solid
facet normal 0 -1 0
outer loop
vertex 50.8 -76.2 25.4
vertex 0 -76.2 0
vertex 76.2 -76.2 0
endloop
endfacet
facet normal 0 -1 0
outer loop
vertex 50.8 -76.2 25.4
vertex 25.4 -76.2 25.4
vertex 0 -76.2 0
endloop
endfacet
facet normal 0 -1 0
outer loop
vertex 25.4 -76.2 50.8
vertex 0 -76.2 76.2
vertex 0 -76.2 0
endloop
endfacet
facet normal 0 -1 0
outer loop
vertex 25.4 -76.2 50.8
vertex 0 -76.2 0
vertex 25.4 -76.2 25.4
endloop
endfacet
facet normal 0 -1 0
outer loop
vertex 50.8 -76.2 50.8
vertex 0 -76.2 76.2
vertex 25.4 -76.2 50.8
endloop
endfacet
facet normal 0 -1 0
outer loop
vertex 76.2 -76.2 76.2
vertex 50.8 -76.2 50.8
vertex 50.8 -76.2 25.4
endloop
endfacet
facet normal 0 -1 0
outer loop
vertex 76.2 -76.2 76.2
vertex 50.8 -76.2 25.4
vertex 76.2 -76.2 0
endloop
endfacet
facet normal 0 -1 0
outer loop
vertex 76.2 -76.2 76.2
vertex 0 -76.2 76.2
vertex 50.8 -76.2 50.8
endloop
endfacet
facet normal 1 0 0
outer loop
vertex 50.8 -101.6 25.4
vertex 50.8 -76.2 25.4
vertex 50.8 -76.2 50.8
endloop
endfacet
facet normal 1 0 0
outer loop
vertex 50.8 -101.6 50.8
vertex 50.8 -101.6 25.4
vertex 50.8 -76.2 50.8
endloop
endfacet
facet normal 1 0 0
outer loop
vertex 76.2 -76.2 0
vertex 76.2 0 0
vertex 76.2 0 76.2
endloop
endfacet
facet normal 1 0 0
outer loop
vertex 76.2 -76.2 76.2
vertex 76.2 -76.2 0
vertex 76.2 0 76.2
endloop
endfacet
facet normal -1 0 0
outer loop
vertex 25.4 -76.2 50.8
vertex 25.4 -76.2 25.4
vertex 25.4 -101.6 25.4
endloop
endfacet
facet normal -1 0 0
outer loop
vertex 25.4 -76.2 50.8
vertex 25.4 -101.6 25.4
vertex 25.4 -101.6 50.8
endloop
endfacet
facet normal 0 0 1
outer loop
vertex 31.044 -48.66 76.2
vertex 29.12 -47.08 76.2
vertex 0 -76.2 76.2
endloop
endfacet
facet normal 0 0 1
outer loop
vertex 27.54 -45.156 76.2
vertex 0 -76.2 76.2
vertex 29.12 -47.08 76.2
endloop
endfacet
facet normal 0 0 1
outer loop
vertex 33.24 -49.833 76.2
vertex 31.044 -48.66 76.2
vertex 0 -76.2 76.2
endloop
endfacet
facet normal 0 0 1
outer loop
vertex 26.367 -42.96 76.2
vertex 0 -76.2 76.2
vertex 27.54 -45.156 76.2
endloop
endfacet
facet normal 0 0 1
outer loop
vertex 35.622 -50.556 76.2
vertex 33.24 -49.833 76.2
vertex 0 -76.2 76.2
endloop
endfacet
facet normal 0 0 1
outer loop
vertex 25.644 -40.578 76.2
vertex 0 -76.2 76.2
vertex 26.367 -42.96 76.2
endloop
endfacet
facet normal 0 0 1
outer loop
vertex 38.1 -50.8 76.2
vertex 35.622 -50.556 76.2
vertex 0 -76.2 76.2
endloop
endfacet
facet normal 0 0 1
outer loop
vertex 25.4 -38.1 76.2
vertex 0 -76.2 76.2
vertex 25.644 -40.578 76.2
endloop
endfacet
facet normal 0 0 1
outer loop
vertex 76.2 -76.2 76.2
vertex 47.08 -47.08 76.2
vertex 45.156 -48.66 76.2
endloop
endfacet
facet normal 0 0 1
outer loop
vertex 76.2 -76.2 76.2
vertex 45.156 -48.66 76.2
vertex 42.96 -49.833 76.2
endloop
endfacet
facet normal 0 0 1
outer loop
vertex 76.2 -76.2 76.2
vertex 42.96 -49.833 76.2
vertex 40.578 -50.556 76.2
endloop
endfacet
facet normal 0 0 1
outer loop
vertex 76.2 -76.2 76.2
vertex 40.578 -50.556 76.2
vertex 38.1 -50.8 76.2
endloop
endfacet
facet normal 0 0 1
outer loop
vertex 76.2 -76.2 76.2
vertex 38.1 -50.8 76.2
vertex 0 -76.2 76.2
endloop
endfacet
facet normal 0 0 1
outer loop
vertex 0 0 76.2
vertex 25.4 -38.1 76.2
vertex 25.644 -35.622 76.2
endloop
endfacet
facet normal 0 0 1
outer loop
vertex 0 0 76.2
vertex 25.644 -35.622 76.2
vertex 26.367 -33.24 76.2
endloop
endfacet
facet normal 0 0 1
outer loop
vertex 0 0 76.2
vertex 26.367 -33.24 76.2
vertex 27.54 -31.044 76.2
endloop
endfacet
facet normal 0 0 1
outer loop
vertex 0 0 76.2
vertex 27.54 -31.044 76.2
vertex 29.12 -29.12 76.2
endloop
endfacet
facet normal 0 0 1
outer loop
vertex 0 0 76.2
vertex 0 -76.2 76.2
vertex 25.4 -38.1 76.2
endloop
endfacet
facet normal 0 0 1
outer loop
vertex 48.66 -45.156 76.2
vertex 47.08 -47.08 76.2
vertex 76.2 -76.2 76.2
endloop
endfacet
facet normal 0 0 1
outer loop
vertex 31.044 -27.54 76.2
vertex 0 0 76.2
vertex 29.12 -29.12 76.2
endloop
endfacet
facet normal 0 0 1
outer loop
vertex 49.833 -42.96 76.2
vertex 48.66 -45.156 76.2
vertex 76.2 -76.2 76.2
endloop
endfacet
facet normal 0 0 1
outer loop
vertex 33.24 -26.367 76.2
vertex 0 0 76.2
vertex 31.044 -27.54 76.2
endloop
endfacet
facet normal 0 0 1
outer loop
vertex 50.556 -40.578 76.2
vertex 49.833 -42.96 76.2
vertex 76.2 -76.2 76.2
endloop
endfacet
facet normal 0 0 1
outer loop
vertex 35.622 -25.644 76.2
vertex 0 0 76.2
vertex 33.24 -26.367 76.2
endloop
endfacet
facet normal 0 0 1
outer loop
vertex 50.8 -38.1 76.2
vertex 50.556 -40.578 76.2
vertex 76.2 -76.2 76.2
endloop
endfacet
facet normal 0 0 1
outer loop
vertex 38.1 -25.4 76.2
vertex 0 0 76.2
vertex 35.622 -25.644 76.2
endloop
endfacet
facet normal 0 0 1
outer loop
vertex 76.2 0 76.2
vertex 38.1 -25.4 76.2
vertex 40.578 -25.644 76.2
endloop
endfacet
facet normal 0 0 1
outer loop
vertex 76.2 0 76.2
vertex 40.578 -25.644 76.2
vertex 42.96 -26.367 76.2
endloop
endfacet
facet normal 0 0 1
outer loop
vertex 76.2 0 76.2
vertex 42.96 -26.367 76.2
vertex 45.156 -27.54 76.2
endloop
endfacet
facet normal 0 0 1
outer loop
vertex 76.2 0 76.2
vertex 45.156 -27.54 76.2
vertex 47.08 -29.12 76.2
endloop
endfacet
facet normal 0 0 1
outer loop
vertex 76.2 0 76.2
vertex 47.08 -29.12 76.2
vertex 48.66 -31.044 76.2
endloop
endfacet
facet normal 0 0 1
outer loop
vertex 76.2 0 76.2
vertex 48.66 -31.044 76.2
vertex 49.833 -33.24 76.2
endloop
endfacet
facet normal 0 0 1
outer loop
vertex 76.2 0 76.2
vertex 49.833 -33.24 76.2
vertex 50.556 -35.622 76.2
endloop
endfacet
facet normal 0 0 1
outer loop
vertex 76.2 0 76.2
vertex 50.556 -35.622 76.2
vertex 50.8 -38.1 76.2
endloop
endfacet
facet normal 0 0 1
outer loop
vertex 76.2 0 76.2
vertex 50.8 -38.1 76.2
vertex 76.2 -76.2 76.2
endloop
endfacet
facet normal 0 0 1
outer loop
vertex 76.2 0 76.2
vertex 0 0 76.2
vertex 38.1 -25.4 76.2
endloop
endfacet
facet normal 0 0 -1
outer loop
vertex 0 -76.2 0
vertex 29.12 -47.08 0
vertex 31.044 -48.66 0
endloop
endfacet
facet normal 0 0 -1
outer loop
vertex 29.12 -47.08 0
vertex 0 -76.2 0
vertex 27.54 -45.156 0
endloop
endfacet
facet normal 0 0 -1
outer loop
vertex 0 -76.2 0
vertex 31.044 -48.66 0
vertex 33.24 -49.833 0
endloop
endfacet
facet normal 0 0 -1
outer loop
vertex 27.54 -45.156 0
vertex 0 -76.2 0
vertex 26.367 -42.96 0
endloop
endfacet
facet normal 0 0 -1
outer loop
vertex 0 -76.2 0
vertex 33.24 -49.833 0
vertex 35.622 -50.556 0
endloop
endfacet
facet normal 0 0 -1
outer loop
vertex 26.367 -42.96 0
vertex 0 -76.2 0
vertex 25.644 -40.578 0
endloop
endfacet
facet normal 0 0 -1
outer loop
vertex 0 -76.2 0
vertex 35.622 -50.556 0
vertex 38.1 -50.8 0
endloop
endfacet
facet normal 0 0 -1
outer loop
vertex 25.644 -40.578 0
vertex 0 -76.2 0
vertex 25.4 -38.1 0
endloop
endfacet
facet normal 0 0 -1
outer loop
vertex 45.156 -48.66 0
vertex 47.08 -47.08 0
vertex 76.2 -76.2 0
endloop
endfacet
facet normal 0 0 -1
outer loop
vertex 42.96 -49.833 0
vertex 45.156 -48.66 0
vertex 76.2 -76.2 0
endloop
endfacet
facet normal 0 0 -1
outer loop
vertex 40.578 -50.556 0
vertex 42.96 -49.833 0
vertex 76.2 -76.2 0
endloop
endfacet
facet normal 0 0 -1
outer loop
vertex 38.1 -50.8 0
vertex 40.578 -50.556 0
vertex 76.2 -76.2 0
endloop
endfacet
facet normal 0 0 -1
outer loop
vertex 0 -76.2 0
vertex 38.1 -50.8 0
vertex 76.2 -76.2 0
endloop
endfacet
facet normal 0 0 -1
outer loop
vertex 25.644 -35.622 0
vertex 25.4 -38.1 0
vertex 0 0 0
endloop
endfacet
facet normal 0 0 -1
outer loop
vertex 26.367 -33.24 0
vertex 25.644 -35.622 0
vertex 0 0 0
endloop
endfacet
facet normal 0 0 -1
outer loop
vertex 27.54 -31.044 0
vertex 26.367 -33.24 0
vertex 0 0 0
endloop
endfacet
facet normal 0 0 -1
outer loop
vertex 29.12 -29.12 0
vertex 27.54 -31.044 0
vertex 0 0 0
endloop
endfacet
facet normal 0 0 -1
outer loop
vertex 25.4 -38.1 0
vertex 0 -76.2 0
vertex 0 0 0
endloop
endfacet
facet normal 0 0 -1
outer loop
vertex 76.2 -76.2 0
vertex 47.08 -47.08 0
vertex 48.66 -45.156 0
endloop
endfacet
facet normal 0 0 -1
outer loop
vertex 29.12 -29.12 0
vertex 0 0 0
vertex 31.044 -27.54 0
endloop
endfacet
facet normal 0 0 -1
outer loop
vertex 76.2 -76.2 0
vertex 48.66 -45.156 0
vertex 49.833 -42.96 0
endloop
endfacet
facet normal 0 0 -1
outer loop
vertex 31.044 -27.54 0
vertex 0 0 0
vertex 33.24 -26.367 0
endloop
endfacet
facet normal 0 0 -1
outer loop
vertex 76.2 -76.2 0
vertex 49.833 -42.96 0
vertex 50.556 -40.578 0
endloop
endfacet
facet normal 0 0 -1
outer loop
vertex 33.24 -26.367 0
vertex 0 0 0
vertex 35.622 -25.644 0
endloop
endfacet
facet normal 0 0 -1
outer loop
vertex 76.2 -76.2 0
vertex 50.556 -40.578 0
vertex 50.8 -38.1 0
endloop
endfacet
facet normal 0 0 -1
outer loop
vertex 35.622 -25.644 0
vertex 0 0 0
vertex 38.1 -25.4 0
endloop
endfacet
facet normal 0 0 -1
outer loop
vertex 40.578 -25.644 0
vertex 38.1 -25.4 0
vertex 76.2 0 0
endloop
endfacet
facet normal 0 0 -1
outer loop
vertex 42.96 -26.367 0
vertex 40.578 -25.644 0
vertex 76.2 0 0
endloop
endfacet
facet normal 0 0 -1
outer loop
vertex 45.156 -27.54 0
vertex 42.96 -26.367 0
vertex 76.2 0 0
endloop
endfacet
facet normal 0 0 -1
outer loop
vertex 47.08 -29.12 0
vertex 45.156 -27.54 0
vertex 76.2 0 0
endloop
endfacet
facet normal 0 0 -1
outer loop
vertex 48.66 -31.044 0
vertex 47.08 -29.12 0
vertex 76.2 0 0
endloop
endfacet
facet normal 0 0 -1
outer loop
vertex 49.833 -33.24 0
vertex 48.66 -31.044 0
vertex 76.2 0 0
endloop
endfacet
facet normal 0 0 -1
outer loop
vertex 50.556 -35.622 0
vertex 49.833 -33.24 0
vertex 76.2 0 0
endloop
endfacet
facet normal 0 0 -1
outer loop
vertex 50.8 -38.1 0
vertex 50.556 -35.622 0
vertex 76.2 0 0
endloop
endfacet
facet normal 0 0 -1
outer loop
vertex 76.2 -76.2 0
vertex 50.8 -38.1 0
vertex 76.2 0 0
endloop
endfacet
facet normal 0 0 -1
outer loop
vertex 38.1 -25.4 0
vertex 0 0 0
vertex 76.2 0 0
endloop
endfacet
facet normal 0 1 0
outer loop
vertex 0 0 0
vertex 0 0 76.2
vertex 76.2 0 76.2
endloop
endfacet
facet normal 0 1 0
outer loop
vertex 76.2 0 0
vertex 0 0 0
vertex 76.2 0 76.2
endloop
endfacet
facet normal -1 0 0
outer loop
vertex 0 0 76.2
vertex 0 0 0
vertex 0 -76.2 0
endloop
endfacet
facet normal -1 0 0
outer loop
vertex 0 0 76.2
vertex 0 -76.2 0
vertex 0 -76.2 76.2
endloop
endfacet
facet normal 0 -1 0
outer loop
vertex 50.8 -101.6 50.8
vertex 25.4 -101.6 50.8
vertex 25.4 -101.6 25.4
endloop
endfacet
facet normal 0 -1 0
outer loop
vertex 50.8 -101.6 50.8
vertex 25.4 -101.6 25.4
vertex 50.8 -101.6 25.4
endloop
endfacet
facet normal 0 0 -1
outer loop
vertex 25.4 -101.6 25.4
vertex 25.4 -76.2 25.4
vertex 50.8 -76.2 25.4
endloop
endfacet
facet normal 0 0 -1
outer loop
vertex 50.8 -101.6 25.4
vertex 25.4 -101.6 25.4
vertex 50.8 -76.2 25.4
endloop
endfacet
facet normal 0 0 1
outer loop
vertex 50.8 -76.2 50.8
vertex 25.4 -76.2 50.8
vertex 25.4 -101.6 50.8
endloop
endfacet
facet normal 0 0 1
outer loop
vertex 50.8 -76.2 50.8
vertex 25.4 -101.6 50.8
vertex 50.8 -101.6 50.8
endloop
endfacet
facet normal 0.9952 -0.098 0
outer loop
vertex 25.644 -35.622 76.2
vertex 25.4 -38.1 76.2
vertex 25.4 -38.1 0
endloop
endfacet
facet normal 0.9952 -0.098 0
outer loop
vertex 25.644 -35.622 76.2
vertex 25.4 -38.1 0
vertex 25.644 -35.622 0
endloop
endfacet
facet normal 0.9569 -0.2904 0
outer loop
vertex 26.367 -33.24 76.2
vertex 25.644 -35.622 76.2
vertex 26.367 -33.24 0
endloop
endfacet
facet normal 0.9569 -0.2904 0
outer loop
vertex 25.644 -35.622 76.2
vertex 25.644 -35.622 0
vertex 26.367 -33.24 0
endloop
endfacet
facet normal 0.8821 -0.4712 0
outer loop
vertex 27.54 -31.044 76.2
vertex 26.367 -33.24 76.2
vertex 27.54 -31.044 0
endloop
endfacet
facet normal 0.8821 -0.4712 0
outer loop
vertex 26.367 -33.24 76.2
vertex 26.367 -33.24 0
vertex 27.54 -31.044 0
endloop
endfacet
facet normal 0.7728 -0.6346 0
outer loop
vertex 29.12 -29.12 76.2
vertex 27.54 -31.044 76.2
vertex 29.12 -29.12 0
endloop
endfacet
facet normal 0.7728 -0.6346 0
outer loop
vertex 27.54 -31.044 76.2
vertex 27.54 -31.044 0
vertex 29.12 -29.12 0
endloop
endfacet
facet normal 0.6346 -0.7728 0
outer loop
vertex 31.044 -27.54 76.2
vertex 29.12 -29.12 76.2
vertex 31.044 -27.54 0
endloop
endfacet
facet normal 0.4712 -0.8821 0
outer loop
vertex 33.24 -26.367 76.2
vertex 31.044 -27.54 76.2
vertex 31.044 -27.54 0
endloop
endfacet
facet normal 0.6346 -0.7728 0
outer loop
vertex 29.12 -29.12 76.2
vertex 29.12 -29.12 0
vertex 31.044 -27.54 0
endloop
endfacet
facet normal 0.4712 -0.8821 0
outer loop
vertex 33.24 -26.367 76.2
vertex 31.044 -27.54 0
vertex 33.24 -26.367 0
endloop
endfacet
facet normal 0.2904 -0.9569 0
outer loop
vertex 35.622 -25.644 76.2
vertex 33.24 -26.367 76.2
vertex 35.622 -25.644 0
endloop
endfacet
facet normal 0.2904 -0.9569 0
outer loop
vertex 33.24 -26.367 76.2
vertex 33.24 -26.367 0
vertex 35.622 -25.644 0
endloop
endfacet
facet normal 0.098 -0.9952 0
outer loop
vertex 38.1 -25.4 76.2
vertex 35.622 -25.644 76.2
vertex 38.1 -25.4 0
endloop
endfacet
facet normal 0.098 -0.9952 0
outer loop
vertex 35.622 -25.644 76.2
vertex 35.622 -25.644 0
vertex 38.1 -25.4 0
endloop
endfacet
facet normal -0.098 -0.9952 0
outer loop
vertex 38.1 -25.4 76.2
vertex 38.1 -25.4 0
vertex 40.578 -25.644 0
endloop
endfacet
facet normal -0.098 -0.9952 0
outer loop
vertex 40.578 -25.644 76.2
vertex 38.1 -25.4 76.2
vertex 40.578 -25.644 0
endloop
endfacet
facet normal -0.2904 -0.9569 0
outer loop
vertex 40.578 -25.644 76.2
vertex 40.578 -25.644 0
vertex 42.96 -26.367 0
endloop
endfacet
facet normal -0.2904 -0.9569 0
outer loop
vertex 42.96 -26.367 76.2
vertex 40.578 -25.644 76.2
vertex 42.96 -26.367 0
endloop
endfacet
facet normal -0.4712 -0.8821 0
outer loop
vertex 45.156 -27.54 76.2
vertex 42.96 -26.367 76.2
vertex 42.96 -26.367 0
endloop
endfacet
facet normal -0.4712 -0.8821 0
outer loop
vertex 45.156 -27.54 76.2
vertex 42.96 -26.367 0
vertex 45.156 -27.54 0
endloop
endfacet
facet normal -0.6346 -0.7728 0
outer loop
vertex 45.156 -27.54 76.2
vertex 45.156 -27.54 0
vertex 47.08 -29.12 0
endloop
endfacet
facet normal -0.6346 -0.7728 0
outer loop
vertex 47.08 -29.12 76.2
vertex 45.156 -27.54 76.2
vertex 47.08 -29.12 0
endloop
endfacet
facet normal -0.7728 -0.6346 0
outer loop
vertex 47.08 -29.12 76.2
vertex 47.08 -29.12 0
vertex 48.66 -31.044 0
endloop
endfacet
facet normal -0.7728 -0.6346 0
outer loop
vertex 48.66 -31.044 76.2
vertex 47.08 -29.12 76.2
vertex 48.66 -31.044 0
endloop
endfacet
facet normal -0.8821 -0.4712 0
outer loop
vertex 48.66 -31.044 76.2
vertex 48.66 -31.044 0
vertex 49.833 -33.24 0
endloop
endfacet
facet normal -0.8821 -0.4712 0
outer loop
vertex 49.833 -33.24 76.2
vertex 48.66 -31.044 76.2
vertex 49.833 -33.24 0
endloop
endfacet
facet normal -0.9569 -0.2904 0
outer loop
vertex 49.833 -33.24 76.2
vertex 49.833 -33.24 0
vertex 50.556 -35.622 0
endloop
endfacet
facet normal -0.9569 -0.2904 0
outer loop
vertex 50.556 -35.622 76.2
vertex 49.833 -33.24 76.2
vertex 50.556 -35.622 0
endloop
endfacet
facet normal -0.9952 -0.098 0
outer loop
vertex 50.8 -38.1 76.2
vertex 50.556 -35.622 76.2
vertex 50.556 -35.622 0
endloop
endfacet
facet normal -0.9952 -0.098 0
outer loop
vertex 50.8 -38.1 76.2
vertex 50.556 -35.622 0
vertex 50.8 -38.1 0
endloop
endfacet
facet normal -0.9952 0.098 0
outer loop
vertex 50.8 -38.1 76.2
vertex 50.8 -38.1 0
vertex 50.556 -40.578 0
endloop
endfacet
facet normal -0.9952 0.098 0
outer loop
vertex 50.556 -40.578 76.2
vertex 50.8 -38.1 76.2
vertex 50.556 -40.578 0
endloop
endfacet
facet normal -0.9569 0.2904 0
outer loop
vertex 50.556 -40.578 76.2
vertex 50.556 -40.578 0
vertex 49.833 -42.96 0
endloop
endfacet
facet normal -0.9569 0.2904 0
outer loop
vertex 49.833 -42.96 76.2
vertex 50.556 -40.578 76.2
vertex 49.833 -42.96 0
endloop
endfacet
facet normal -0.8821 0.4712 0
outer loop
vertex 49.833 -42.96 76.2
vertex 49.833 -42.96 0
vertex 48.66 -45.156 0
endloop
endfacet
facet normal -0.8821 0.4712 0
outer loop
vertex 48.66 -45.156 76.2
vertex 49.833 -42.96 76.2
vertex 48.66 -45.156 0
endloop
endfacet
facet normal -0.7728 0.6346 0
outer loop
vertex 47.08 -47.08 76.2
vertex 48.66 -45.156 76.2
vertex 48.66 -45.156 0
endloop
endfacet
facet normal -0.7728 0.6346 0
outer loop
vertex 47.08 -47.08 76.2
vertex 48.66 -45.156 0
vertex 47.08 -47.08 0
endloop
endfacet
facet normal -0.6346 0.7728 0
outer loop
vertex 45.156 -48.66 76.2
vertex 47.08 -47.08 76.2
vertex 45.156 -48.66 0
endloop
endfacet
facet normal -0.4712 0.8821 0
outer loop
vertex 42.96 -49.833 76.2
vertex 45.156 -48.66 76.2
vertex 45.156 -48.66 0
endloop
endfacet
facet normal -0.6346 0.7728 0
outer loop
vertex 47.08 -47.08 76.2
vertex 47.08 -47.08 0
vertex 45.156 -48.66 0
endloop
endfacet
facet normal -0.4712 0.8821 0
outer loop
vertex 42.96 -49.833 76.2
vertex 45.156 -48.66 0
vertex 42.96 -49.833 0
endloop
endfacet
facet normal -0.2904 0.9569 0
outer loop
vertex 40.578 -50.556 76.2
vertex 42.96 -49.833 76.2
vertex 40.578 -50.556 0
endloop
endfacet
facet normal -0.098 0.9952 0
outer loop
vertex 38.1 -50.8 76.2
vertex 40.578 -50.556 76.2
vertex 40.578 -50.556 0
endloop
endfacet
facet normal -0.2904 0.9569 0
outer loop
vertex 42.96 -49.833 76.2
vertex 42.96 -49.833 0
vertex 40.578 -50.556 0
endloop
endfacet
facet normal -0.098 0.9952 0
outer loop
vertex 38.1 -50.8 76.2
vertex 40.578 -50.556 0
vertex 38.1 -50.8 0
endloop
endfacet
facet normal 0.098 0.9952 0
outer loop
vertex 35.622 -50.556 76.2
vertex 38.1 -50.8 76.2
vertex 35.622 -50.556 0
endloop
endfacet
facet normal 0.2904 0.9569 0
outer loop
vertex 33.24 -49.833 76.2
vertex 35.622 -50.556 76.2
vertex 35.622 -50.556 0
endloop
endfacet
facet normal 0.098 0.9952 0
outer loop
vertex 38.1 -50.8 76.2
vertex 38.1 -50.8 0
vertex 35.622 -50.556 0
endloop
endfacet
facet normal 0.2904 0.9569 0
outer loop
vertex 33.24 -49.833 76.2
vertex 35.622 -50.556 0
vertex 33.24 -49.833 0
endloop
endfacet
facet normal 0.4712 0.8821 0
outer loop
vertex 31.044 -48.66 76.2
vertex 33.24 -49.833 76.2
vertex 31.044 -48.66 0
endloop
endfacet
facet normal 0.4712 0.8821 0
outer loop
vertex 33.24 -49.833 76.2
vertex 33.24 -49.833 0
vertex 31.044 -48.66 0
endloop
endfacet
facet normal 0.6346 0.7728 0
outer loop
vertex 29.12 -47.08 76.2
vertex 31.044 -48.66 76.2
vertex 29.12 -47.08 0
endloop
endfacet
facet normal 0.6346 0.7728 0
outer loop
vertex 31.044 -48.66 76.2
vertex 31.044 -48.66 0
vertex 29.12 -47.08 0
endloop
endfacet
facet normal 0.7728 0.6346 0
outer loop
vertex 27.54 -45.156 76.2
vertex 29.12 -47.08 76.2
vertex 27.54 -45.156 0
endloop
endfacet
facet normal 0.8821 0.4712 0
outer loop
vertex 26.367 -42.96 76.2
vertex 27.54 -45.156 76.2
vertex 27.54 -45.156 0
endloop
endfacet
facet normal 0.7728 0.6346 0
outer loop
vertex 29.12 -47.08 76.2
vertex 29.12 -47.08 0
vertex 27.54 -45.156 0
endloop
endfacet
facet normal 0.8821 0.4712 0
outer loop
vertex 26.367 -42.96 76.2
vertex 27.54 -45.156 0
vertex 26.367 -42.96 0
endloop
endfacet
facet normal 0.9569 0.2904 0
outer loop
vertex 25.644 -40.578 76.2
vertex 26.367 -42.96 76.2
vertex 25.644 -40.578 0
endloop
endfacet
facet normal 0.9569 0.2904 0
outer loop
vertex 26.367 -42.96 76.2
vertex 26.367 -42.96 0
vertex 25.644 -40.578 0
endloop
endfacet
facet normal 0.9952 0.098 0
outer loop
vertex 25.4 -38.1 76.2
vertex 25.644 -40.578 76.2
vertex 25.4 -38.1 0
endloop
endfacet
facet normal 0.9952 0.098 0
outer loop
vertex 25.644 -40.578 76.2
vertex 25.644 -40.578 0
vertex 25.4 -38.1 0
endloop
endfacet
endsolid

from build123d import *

# Parameters (mm, degrees)
F0_W     = 76.2
F0_H     = 76.2
F1_DEPTH = 76.2
F2_W     = 25.4
F2_H     = 25.4
F3_DEPTH = 25.4
F5_D     = 25.4


# Not quite as in the source:
# - the program builds the solid bodies; features that only make, move or delete a surface that nothing else refers to are left out


with BuildPart() as f1:
    # F0 (on Front) → F1 (new body)
    with BuildSketch(Plane.XZ):
        with Locations((38.1, 38.1)):
            Rectangle(F0_W, F0_H)
    extrude(amount=F1_DEPTH)

    # F2 (on face) → F3 (join)
    with BuildSketch(Plane.XZ.offset(76.2)):
        with Locations((38.1, 38.1)):
            Rectangle(F2_W, F2_H)
    extrude(amount=F3_DEPTH)

    # F5 (through all)
    with Locations(Plane.XY.offset(76.2)):
        with Locations((38.1, -38.1)):
            Hole(F5_D / 2)


solid = f1.part
